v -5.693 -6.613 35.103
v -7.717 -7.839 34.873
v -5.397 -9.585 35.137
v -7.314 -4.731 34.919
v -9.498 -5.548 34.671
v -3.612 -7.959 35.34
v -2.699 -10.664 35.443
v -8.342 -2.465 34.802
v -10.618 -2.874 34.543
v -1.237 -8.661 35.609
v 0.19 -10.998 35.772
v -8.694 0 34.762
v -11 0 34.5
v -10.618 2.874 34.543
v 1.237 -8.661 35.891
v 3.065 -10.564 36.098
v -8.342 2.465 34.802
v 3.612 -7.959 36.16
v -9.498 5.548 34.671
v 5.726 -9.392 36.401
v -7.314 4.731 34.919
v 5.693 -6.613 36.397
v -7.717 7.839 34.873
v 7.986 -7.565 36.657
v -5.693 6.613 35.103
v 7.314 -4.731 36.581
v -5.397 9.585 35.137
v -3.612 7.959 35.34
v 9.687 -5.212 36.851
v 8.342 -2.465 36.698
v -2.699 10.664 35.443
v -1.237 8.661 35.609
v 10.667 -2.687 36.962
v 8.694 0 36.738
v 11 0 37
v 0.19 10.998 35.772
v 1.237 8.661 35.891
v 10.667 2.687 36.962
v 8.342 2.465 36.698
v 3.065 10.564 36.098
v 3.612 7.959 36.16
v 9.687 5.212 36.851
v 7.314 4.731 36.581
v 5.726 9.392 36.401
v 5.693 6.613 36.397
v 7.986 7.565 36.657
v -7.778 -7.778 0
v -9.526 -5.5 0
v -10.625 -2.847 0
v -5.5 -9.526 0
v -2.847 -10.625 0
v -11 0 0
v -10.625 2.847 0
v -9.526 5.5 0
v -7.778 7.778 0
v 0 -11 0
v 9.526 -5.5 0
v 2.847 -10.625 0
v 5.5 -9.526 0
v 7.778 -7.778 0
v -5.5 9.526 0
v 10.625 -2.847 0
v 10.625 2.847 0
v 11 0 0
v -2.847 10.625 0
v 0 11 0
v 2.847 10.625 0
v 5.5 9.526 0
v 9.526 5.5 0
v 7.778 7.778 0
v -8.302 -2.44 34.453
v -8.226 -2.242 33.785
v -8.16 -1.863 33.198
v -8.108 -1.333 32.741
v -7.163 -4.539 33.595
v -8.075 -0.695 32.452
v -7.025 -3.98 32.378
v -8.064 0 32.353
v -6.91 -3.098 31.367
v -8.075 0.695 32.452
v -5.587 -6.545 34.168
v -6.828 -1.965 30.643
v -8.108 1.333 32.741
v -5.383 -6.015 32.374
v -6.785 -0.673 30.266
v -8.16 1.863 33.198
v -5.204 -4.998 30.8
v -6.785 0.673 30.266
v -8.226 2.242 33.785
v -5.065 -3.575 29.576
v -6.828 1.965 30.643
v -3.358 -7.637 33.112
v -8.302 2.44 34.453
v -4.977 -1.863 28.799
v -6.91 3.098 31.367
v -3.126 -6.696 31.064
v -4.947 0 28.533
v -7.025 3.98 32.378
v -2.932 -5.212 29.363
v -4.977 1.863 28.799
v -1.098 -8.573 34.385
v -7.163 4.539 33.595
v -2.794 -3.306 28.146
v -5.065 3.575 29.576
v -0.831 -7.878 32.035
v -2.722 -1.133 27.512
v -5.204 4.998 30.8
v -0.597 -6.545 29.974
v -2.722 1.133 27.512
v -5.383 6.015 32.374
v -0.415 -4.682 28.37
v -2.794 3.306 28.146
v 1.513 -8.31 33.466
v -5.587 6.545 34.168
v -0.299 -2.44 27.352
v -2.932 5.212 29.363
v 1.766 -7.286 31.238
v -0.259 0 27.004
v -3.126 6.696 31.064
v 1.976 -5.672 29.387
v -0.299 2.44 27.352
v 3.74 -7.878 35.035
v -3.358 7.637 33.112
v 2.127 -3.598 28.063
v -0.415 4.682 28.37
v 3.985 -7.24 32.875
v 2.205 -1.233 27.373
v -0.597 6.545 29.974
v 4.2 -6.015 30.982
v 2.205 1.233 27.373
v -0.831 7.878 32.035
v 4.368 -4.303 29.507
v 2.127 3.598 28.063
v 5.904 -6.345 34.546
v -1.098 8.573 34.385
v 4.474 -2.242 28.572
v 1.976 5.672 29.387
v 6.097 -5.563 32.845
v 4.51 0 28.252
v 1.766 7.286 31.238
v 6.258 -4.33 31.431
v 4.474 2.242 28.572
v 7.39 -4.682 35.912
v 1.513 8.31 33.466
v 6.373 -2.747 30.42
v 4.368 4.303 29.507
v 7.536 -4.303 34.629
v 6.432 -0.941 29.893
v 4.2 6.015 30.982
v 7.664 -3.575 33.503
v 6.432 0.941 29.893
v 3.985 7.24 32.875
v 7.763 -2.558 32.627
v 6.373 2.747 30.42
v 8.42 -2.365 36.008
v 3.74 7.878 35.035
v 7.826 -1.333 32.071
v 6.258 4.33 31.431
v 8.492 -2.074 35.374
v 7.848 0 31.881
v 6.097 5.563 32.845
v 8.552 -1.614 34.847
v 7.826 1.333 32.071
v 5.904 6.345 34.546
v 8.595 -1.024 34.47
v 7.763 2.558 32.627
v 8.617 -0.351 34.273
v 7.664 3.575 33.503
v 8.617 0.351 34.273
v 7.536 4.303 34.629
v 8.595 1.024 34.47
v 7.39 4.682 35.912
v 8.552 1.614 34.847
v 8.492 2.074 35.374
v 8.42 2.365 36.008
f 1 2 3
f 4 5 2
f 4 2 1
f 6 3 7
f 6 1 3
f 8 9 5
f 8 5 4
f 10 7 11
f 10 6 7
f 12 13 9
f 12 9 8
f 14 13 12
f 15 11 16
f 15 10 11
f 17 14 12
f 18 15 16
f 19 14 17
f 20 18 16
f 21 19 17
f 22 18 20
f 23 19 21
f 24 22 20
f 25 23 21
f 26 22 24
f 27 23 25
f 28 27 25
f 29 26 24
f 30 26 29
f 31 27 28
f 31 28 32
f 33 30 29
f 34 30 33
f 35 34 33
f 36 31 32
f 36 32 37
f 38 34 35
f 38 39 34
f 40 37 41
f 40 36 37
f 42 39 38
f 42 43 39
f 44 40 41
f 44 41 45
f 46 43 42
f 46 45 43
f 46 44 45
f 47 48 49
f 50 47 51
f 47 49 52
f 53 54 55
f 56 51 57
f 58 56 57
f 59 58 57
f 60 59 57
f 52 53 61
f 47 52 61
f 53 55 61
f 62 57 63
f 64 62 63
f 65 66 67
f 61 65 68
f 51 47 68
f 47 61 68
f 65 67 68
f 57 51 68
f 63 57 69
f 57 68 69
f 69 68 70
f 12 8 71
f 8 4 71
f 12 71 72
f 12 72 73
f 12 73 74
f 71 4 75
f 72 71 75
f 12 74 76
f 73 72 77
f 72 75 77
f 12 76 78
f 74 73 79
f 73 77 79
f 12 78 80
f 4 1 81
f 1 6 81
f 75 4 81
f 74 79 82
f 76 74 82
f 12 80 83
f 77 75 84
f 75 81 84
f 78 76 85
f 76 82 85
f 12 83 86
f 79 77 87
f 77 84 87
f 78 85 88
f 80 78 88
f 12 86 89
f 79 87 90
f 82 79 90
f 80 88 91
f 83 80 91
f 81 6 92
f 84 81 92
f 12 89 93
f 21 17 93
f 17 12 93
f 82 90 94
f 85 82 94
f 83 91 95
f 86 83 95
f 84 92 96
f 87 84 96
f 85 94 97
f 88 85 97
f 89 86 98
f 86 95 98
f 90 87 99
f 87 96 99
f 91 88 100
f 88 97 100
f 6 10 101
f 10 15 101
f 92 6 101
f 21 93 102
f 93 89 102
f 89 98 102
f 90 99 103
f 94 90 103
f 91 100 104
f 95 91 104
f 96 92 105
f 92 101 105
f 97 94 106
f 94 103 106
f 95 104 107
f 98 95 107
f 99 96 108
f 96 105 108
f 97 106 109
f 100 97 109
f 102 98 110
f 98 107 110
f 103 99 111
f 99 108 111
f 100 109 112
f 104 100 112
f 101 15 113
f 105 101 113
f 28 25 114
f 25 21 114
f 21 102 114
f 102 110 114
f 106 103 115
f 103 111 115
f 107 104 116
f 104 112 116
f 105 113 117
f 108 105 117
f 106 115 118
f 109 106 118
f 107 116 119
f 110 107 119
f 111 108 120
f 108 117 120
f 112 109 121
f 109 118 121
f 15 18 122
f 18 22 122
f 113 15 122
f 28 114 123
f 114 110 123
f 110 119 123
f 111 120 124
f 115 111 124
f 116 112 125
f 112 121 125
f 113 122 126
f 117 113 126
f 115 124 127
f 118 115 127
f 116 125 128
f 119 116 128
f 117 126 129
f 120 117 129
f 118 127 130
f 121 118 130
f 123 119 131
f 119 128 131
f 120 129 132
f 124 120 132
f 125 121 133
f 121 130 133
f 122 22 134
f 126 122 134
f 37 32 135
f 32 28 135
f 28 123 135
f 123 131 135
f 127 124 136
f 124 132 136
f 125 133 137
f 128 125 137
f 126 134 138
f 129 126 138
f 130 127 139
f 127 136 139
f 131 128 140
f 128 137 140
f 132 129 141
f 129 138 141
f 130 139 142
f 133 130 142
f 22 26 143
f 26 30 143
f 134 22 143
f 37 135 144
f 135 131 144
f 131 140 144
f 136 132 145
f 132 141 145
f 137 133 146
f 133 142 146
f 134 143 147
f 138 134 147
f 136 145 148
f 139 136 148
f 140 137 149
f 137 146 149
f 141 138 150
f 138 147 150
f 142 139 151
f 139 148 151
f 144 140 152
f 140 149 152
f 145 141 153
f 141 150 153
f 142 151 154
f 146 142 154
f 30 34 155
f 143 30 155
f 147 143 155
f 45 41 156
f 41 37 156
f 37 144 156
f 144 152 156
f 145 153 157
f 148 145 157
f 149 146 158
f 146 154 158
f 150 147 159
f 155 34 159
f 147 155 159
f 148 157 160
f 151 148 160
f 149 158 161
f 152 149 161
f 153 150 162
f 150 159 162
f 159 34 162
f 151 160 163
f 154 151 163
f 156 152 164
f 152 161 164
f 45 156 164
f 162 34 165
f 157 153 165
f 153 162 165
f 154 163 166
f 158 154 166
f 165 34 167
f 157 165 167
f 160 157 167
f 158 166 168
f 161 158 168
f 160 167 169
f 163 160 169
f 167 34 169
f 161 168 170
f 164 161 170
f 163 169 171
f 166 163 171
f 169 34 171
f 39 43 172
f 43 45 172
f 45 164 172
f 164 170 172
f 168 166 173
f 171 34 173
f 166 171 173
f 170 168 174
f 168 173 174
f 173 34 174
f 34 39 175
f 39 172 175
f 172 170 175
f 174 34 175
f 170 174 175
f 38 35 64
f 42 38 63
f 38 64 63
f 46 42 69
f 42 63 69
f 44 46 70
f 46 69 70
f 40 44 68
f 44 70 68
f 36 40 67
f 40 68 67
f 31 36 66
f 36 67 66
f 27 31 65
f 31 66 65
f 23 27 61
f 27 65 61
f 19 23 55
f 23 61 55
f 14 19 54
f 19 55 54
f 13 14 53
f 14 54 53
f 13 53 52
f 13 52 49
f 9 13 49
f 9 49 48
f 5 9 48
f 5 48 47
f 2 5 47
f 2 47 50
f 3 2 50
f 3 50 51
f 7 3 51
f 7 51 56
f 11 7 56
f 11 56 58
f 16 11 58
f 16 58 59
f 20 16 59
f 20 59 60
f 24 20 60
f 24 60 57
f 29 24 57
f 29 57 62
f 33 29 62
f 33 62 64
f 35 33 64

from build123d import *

# Parameters (mm, degrees)
F0_R          = 11
F1_DEPTH      = 37
F3_DEPTH      = 11.001
F3_DEPTH_BACK = 11.001


with BuildPart() as f1:
    # F0 (on Top) → F1 (new body)
    with BuildSketch(Plane.XY):
        Circle(F0_R)
    extrude(amount=F1_DEPTH)

    # F2 (on Front) → F3 (cut, two sides)
    with BuildSketch(Plane.XZ) as f3_sk:
        Polygon((11, 37), (-11, 37), (-11, 34.5), align=None)
    extrude(amount=-F3_DEPTH, mode=Mode.SUBTRACT)
    extrude(f3_sk.sketch, amount=F3_DEPTH_BACK, mode=Mode.SUBTRACT)

    # F4 (on face) → F5 (revolve, cut)
    with BuildSketch(Plane(origin=(-4.010708822, 0, 35.2942376339), x_dir=(0.9936052548, 0, 0.112909688), z_dir=(-0.112909688, 0, 0.9936052548))):
        with BuildLine():
            Line((12.7865213476, 0), (-4.7134786524, 0))
            ThreePointArc((-4.7134786524, 0), (4.0365213476, -8.75), (12.7865213476, 0))
        make_face()
    revolve(axis=Axis((0, 0, 35.75), (0.9936052548, 0, 0.112909688)), mode=Mode.SUBTRACT)


solid = f1.part
